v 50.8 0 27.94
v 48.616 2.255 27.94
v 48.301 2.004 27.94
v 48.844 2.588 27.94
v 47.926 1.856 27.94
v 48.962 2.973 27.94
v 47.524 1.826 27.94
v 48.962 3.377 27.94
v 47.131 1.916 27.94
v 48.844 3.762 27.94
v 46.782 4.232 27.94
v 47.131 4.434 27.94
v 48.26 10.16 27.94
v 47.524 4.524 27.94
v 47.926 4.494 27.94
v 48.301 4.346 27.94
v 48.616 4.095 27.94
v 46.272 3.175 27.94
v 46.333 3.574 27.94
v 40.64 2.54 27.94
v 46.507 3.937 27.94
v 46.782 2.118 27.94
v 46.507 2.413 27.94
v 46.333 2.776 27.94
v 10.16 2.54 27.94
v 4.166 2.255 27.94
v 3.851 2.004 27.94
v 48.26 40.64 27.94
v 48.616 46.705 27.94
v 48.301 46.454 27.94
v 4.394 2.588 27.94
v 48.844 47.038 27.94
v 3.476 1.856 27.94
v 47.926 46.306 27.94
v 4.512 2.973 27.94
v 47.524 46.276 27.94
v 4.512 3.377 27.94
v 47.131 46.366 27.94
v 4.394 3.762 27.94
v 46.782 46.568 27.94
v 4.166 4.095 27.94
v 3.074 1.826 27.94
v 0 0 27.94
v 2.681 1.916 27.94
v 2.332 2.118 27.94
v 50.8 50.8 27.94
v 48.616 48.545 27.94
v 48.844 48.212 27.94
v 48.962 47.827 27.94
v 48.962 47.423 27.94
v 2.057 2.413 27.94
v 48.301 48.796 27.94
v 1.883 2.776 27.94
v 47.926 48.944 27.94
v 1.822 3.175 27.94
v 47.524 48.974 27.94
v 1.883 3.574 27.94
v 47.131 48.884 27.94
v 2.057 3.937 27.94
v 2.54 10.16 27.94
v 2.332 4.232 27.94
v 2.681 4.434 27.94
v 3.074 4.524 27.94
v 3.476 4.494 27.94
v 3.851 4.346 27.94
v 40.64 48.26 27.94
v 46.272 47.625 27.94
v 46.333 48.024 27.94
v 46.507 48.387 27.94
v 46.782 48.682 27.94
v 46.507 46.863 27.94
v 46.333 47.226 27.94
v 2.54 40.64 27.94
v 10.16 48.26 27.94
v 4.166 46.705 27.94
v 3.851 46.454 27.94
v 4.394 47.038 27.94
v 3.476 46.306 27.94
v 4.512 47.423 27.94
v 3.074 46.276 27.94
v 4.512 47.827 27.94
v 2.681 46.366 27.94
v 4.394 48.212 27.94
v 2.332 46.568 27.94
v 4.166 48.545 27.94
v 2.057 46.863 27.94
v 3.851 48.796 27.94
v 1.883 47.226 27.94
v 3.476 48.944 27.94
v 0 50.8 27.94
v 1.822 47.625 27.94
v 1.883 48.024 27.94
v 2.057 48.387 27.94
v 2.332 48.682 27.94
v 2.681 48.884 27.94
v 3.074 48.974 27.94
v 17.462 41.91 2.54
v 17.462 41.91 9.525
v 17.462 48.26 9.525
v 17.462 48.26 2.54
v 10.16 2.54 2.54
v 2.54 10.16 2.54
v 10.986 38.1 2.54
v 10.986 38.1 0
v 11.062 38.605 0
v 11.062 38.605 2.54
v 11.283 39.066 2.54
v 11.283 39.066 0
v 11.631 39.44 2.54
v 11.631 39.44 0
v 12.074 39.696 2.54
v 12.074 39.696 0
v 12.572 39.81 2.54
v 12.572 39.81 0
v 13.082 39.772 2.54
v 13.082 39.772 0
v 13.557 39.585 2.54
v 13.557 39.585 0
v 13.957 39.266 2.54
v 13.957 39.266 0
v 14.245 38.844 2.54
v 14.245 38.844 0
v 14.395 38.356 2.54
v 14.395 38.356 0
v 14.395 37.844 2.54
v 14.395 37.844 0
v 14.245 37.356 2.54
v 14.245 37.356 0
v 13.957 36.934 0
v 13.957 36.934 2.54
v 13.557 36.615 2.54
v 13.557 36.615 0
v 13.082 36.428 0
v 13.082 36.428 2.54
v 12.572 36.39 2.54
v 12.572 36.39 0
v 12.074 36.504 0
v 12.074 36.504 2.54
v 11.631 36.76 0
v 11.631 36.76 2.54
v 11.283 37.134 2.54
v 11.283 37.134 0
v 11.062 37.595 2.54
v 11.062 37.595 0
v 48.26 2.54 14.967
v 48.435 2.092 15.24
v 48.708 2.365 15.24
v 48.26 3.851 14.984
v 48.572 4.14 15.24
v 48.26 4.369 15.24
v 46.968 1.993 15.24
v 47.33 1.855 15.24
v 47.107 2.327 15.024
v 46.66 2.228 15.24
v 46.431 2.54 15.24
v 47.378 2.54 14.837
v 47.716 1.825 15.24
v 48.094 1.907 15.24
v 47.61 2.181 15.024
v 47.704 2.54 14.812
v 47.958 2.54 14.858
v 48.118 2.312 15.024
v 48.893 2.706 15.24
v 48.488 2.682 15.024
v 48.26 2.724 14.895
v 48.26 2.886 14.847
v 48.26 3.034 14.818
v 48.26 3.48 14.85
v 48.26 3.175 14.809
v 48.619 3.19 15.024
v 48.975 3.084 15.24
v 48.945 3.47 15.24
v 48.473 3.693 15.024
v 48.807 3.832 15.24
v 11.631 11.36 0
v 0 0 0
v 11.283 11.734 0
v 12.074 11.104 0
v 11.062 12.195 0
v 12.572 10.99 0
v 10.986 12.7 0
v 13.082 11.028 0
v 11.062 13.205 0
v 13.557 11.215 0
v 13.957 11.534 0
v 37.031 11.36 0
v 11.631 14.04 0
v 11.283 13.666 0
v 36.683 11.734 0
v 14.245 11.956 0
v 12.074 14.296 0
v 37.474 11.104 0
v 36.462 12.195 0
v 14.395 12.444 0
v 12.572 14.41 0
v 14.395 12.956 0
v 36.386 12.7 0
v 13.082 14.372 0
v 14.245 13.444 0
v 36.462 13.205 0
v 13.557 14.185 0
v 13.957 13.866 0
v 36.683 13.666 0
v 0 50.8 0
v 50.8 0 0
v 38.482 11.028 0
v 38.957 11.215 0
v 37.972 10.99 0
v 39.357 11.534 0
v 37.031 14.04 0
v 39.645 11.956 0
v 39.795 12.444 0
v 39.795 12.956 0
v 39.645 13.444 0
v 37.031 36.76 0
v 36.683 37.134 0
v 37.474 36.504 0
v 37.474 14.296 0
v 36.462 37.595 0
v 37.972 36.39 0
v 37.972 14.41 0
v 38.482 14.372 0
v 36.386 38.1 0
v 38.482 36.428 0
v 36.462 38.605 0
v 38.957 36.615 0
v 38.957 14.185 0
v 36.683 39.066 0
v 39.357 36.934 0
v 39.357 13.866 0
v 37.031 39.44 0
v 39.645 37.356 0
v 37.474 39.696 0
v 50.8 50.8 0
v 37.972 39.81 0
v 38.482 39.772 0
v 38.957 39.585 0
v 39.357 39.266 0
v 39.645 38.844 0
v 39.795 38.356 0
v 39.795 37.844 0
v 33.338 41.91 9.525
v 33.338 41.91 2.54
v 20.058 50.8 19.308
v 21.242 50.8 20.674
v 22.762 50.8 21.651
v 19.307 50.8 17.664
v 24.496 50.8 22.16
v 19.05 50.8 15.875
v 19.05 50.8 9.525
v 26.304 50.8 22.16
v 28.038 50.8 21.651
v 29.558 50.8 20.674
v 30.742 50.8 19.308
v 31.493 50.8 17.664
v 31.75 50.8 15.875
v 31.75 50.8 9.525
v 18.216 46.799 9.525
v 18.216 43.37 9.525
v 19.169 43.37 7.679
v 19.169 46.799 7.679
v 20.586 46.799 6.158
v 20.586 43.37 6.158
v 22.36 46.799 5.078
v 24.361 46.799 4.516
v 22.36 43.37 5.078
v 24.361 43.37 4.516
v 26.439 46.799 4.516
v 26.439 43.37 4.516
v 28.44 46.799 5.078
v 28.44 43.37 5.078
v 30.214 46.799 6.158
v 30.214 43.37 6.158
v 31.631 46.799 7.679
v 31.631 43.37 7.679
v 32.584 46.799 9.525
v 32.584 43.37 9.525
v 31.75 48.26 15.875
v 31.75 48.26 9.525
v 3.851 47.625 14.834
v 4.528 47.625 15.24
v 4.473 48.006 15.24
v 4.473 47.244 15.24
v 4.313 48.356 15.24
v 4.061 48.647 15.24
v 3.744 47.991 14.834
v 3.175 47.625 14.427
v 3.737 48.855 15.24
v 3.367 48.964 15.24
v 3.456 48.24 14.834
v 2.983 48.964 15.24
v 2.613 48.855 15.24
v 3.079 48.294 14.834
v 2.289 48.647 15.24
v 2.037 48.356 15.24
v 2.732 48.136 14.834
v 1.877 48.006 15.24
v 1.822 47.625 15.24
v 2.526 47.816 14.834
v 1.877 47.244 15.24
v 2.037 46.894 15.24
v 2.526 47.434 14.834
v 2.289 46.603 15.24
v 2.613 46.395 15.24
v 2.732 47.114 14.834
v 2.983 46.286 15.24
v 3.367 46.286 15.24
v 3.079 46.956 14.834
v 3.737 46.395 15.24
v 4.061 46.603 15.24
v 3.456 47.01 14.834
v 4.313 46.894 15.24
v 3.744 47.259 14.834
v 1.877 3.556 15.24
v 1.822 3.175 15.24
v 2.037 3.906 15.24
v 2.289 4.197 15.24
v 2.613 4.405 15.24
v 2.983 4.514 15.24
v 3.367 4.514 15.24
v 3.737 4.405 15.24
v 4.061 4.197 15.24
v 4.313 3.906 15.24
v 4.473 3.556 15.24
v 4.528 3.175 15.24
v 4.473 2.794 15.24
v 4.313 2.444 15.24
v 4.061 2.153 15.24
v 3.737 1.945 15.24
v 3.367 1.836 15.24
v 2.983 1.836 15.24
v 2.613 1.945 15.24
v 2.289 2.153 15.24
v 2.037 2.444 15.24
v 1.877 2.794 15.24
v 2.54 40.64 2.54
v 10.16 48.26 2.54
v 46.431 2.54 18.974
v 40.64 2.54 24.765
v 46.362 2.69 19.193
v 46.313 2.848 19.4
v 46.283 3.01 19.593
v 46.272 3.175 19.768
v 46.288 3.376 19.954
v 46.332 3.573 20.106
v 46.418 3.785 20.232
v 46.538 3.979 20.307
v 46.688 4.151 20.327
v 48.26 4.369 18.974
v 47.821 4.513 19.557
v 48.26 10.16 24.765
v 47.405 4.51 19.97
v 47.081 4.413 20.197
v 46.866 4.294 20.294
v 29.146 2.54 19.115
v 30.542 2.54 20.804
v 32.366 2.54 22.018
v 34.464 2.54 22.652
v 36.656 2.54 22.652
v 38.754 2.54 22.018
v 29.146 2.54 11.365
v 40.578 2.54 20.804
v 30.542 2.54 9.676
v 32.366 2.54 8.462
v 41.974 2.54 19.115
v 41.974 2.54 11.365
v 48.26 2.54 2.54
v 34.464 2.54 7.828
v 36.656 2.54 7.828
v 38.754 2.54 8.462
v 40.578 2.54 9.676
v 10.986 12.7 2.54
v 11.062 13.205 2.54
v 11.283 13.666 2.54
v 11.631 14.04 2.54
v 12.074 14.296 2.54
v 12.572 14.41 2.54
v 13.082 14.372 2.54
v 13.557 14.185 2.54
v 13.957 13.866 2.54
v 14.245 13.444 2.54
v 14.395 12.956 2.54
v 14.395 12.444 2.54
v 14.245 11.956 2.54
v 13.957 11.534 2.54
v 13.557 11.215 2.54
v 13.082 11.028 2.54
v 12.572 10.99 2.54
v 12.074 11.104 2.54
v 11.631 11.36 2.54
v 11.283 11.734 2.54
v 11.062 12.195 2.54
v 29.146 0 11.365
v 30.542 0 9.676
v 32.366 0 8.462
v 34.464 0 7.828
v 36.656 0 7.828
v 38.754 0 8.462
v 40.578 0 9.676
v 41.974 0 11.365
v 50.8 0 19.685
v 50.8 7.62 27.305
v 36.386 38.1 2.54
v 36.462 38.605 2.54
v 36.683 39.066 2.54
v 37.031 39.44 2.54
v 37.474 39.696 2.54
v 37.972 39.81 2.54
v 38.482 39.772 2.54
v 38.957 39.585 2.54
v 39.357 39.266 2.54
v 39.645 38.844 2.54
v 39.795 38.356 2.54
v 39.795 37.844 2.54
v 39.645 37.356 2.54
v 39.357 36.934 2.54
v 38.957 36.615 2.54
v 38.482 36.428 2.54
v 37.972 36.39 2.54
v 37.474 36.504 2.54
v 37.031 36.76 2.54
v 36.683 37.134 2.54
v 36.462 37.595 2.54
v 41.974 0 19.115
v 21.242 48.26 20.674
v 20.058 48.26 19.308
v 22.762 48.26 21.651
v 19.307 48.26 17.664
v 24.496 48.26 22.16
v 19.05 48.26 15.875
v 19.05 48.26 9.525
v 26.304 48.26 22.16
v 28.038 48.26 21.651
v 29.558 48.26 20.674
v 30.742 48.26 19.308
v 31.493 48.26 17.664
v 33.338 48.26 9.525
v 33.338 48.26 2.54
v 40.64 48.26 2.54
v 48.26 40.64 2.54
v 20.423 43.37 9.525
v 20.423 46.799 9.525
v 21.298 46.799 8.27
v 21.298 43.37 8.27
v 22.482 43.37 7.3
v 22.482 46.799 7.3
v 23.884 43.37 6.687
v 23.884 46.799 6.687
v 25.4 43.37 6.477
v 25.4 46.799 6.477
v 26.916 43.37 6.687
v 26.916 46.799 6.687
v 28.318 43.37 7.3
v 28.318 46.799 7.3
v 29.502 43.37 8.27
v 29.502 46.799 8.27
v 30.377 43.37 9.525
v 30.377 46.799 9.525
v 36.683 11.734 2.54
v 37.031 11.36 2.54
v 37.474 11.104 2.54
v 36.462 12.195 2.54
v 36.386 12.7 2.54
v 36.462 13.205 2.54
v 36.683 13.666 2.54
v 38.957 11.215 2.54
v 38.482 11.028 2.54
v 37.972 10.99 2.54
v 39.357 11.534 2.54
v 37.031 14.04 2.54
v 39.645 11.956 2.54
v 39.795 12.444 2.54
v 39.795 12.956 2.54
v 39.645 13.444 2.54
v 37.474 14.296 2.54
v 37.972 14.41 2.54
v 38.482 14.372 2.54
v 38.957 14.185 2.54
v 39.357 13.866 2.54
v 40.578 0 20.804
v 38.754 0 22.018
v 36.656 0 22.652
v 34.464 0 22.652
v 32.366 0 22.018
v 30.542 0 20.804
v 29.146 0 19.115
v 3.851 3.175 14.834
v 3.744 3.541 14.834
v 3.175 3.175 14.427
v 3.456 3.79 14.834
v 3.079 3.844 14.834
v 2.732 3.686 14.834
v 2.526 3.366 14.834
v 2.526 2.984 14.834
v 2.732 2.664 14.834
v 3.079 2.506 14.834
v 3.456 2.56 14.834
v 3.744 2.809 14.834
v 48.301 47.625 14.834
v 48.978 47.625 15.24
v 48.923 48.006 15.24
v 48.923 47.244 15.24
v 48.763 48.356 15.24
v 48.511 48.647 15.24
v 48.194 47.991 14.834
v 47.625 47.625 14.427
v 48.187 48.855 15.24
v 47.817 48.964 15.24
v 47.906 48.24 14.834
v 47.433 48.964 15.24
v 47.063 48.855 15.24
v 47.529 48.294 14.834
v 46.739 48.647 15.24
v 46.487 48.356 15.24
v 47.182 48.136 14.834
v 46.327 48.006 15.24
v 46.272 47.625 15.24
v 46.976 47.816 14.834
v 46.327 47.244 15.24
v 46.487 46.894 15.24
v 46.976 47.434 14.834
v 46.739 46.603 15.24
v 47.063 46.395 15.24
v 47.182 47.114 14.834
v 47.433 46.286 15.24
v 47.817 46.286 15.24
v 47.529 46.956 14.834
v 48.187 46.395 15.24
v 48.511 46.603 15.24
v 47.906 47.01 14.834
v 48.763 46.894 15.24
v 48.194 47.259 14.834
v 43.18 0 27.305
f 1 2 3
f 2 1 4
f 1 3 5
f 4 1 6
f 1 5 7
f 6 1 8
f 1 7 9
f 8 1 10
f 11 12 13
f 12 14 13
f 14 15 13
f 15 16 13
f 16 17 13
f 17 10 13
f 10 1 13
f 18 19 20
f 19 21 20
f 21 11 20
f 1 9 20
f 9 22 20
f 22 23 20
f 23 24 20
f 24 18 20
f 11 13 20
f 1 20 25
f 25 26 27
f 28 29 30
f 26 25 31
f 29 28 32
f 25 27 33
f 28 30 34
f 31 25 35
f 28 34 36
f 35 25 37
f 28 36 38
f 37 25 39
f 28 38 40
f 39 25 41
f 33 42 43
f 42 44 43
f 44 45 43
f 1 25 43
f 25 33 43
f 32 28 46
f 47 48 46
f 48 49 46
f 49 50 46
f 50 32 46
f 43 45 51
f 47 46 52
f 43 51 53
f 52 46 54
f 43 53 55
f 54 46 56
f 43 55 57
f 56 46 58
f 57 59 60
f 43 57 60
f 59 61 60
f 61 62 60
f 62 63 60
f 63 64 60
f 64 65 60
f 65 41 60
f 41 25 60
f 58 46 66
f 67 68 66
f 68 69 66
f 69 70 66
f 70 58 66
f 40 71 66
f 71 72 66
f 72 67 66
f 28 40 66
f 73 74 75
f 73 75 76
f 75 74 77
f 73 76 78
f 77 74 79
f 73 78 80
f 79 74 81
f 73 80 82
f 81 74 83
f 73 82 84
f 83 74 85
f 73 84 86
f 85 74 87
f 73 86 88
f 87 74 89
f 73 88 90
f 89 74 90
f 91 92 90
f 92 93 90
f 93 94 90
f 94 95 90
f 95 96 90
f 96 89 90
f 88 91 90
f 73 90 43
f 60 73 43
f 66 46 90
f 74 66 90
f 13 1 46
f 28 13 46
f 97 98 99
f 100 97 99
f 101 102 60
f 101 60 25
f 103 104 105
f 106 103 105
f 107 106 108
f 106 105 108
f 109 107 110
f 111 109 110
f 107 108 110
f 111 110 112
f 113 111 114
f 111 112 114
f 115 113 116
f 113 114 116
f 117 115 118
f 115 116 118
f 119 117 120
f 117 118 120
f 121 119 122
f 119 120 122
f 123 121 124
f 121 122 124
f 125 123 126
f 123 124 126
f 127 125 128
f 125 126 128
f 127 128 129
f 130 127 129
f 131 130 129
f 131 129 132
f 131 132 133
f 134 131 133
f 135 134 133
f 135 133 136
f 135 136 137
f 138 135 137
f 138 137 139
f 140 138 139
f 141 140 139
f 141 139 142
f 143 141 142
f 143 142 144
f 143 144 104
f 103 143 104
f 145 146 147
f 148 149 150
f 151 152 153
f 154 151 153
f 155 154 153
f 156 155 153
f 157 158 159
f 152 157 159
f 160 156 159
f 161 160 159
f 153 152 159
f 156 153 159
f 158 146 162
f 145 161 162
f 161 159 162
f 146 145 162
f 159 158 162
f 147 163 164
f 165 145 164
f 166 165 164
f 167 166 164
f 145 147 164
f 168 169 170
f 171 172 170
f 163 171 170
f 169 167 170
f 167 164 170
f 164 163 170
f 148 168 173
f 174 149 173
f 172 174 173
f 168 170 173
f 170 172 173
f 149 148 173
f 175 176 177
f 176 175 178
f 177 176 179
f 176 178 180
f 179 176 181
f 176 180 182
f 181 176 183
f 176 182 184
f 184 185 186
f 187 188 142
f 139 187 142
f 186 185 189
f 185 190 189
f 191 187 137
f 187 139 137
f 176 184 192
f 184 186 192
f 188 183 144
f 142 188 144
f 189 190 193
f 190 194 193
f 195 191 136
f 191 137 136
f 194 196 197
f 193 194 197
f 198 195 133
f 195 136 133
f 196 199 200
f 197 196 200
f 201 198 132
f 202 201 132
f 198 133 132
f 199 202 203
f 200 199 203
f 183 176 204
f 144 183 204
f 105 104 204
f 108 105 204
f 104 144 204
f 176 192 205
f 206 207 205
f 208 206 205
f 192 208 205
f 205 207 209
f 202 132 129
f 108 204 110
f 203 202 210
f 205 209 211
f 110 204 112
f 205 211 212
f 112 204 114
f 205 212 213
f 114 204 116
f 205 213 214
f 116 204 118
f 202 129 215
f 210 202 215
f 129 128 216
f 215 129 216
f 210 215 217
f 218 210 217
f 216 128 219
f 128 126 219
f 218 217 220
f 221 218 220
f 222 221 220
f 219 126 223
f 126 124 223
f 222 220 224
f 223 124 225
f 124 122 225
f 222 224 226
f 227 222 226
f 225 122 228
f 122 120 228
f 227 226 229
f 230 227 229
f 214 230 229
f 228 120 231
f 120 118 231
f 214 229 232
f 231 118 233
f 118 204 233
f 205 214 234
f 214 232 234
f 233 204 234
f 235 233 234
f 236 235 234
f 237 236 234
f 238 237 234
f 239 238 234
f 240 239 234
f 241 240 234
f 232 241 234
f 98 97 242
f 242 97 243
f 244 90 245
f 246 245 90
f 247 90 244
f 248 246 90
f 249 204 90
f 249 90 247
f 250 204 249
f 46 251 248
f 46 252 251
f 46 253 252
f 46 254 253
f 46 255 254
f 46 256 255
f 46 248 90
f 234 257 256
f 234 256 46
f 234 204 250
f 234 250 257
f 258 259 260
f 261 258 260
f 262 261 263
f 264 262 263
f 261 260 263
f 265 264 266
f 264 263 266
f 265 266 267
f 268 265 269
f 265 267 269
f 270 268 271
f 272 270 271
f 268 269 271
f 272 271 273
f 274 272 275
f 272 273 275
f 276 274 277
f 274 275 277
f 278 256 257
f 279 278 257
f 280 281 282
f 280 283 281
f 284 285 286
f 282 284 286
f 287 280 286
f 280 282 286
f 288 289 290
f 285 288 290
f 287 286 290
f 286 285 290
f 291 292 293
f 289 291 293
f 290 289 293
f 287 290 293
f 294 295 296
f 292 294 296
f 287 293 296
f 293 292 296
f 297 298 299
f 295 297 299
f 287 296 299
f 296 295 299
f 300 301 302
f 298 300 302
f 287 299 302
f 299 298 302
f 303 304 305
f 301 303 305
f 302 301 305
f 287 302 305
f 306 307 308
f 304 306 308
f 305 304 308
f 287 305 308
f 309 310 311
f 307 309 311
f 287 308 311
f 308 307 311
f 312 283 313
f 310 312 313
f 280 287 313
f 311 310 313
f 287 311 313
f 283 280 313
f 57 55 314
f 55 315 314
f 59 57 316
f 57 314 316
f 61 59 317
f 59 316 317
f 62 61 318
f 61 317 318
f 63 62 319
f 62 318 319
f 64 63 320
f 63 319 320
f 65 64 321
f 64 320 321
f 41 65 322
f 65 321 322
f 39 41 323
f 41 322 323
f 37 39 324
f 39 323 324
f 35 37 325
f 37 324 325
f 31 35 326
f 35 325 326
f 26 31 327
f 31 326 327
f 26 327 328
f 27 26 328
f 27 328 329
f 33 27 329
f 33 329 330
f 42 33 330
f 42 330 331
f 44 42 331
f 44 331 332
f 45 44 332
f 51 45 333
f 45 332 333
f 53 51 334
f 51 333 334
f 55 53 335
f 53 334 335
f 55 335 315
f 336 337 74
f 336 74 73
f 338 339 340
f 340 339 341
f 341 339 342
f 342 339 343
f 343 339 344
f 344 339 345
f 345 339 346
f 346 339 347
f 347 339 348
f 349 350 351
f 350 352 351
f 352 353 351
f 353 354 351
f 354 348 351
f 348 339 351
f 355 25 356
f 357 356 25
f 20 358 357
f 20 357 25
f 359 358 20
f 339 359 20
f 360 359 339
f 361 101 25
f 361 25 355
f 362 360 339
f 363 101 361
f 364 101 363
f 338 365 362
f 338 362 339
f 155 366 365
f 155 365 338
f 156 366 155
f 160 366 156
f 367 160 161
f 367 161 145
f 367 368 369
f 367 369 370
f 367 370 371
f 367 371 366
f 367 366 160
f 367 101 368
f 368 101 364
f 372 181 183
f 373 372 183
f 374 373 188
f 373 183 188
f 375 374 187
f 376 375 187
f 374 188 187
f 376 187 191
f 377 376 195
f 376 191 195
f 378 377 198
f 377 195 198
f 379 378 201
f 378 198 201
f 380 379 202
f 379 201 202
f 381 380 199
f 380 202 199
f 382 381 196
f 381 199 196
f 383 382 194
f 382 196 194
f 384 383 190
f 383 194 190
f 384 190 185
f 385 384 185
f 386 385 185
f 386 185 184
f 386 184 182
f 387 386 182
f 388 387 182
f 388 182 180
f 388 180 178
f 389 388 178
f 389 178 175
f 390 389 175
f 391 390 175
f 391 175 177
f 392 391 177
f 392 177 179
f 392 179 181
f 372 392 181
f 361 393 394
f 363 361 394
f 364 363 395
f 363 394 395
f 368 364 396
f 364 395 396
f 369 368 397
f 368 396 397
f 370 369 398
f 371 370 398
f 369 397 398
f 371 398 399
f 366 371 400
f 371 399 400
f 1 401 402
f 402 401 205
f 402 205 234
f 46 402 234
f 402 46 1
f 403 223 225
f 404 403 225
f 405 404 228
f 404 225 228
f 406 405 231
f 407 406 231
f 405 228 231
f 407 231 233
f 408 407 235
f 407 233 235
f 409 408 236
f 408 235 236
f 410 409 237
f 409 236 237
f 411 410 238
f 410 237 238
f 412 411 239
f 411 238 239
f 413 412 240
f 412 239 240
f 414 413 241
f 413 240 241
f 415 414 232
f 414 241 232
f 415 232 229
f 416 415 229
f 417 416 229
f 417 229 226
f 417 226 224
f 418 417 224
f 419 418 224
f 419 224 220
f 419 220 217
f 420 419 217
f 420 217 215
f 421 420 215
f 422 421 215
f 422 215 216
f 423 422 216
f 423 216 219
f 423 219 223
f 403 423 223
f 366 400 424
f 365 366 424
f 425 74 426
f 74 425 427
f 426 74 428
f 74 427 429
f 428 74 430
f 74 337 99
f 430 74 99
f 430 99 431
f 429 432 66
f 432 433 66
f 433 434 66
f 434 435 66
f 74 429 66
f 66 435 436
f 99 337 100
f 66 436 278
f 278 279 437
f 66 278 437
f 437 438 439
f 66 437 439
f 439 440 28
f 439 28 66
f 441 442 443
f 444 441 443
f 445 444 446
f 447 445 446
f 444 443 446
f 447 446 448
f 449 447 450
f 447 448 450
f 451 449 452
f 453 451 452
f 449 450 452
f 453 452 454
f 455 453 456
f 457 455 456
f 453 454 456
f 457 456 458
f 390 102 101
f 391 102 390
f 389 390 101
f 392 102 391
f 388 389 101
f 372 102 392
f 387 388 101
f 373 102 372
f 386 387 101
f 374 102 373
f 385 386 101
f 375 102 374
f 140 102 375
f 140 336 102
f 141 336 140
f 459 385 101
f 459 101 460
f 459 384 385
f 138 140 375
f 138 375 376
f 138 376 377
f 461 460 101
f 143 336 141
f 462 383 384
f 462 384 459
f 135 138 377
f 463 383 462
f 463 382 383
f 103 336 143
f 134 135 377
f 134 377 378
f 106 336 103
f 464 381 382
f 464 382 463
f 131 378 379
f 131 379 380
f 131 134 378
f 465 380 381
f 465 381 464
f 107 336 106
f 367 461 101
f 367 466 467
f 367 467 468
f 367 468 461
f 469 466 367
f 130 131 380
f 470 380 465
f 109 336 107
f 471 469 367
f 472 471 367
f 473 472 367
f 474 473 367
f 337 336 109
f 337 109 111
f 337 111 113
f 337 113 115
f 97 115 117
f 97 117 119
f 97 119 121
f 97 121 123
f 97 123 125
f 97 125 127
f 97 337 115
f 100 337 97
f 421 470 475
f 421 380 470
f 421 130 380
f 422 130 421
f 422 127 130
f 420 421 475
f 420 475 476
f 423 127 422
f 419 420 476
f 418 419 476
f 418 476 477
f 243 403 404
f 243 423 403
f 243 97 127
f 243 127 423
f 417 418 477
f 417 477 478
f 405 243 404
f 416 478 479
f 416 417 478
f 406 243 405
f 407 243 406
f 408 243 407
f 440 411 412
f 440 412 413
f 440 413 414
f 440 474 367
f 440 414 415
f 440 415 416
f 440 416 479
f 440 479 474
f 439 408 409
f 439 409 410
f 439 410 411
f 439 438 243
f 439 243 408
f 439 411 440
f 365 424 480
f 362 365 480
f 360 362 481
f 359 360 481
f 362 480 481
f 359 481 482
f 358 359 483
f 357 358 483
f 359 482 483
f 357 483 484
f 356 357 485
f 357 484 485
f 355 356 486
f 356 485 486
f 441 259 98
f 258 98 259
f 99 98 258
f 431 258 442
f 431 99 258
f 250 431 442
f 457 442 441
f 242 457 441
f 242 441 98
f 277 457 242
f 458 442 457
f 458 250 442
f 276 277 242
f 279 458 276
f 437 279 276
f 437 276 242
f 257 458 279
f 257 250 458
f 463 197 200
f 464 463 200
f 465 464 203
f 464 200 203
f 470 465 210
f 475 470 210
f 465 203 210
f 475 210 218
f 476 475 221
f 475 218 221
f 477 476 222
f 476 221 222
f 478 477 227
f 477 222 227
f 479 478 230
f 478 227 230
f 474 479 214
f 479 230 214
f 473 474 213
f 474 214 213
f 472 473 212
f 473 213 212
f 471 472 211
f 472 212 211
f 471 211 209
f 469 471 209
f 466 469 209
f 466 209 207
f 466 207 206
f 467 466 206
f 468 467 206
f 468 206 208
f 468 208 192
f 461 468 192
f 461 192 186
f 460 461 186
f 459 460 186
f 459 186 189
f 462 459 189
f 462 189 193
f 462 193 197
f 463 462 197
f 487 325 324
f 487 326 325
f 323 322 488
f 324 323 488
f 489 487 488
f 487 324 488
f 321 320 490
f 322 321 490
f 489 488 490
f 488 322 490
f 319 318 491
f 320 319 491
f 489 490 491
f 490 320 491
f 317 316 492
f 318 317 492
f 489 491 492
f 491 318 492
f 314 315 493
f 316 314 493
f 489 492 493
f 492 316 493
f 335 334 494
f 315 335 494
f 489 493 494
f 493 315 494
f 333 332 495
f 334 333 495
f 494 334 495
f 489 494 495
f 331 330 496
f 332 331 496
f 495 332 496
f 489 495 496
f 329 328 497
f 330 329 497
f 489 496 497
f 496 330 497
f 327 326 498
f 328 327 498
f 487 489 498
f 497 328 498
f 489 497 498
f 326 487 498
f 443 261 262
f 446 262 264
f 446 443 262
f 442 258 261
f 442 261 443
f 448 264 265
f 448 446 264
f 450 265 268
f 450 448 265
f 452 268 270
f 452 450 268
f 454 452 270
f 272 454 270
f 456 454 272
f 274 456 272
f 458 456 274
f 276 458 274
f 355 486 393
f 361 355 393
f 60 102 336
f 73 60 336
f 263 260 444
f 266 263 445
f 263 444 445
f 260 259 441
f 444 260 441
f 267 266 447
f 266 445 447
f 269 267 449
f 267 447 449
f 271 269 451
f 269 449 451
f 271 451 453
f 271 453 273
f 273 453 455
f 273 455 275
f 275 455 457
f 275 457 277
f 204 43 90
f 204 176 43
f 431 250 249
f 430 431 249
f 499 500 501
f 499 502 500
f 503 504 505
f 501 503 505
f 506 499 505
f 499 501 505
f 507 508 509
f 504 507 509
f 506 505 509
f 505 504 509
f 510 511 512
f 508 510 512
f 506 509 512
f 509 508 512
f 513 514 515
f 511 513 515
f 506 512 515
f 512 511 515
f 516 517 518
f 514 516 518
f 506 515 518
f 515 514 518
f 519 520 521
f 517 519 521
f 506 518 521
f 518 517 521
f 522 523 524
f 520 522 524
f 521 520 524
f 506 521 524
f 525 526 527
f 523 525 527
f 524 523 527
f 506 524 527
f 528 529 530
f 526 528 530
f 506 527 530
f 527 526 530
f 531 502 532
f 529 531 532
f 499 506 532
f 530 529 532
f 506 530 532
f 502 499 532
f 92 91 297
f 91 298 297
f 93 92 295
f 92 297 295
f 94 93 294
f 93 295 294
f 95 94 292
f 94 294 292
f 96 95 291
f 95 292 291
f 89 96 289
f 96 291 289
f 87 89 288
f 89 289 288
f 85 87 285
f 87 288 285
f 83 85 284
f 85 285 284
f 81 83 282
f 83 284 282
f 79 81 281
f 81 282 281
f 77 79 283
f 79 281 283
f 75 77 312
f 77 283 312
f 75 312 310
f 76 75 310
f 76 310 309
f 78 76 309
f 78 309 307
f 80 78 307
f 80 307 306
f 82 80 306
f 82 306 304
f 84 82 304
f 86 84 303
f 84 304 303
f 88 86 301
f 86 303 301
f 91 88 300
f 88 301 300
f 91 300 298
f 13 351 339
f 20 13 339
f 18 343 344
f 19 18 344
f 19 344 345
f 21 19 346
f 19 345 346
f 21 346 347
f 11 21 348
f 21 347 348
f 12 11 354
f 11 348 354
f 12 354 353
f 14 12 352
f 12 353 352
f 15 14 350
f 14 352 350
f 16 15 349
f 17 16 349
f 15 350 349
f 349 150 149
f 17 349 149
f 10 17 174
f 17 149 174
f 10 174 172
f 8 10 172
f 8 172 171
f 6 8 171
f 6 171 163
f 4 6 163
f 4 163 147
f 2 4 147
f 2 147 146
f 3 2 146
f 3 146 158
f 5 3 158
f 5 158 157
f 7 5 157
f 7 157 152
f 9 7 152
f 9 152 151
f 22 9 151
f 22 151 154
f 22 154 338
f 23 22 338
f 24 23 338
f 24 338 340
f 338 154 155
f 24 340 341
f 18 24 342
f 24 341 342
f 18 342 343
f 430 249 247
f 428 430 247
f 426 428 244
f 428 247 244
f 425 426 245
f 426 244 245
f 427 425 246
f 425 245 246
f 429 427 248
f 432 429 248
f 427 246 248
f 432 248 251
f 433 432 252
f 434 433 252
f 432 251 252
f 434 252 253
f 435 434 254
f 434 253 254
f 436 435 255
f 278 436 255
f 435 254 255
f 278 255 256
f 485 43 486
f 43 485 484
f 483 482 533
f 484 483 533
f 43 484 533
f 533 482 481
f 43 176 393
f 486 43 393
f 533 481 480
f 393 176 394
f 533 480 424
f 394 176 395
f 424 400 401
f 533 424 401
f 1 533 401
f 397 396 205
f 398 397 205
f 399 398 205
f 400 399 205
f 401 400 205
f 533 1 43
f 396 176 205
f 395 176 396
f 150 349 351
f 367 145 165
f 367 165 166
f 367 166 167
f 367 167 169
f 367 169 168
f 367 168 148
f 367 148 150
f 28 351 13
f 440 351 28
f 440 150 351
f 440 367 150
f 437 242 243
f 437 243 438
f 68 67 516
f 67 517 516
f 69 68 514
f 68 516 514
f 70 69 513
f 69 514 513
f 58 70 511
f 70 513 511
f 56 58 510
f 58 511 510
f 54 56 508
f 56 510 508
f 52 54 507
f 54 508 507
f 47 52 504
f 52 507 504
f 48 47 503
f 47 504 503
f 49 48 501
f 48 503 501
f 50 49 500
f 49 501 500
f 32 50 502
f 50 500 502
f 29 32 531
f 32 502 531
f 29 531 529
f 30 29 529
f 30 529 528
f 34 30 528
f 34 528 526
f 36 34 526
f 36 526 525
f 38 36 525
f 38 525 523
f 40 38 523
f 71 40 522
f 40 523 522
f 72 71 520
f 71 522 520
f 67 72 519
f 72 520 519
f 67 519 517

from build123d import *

# Parameters (mm, degrees)
SKETCH1_W                 = 50.8
SKETCH1_H                 = 50.8
BOSS_EXTRUDE1_DEPTH       = 2.54
SKETCH2_W                 = 50.8
SKETCH2_H                 = 50.8
SKETCH2_W_2               = 45.72
SKETCH2_H_2               = 45.72
BOSS_EXTRUDE2_DEPTH       = 25.4
CUT_EXTRUDE1_REACH        = 79.084
CUT_EXTRUDE3_REACH        = 79.084
BOSS_EXTRUDE3_DEPTH       = 25.4
CUT_EXTRUDE4_START        = -2.54
SKETCH8_W                 = 22.225
SKETCH8_H                 = 7.62
CUT_EXTRUDE4_DEPTH        = 12.7
LOFT1_START               = 36.295124673
LOFT1_DEPTH               = 4.399409051
F_6_32_TAPPED_HOLE1_D     = 2.7051
F_6_32_TAPPED_HOLE1_DEPTH = 12.7
F_6_32_TAPPED_HOLE1_TIP   = 0.81269403
F_6_CLEARANCE_HOLE1_D     = 3.429
SKETCH15_W                = 15.875
SKETCH15_H                = 6.35
BOSS_EXTRUDE5_DEPTH       = 6.985
CUT_EXTRUDE5_START        = -3.175
SKETCH16_R                = 7.62
SKETCH16_R_2              = 5.588
CUT_EXTRUDE5_DEPTH        = 1.7145


with BuildPart() as part:
    # Sketch1 → Boss-Extrude1 (new body)
    with BuildSketch(Plane.XY):
        with Locations((25.4, 25.4)):
            Rectangle(SKETCH1_W, SKETCH1_H)
    extrude(amount=BOSS_EXTRUDE1_DEPTH)

    # Sketch2 → Boss-Extrude2 (add)
    with BuildSketch(Plane.XY.offset(2.54)):
        with Locations((25.4, 25.4)):
            Rectangle(SKETCH2_W, SKETCH2_H)
        with Locations((25.4, 25.4)):
            Rectangle(SKETCH2_W_2, SKETCH2_H_2, mode=Mode.SUBTRACT)
    extrude(amount=BOSS_EXTRUDE2_DEPTH)

    # Sketch3 → Cut-Extrude1 (cut, up to next)
    with BuildSketch(Plane.XZ, mode=Mode.PRIVATE) as cut_extrude1_sk1:
        with BuildLine():
            Line((29.1465, 19.114540844), (29.1465, 11.365459156))
            ThreePointArc((29.1465, 11.365459156), (35.56, 7.747), (41.9735, 11.365459156))
            Line((41.9735, 11.365459156), (41.9735, 19.114540844))
            ThreePointArc((41.9735, 19.114540844), (35.56, 22.733), (29.1465, 19.114540844))
        make_face()
    cut_extrude1_tool1 = extrude(cut_extrude1_sk1.sketch, amount=-CUT_EXTRUDE1_REACH, mode=Mode.PRIVATE) & part.part
    add(cut_extrude1_tool1.solids().sort_by_distance((35.56, 0, 15.24))[0], mode=Mode.SUBTRACT)

    # Sketch4 → Cut-Extrude3 (cut, up to next)
    with BuildSketch(Plane(origin=(0, 50.8, 0), x_dir=(1, 0, 0), z_dir=(0, 1, 0)), mode=Mode.PRIVATE) as cut_extrude3_sk1:
        with BuildLine():
            Line((31.75, -15.875), (31.75, -9.525))
            Line((31.75, -9.525), (19.05, -9.525))
            Line((19.05, -9.525), (19.05, -15.875))
            ThreePointArc((19.05, -15.875), (25.4, -22.225), (31.75, -15.875))
        make_face()
    cut_extrude3_tool1 = extrude(cut_extrude3_sk1.sketch, amount=-CUT_EXTRUDE3_REACH, mode=Mode.PRIVATE) & part.part
    add(cut_extrude3_tool1.solids().sort_by_distance((25.4, 50.8, 15.282228))[0], mode=Mode.SUBTRACT)

    # Sketch6 → Boss-Extrude3 (add)
    with BuildSketch(Plane.XY.offset(2.54)):
        Polygon((2.54, 48.26), (10.16, 48.26), (2.54, 40.64), align=None)
        Polygon((48.26, 48.26), (48.26, 40.64), (40.64, 48.26), align=None)
        Polygon((48.26, 2.54), (48.26, 10.16), (40.64, 2.54), align=None)
        Polygon((2.54, 2.54), (2.54, 10.16), (10.16, 2.54), align=None)
    extrude(amount=BOSS_EXTRUDE3_DEPTH)

    # Sketch8 → Cut-Extrude4 (cut)
    with BuildSketch(Plane(origin=(50.8, 0, 0), x_dir=(0, 0, -1), z_dir=(1, 0, 0)).offset(CUT_EXTRUDE4_START)):
        with Locations((-13.6525, 6.35)):
            Rectangle(SKETCH8_W, SKETCH8_H)
    extrude(amount=-CUT_EXTRUDE4_DEPTH, mode=Mode.SUBTRACT)

    # Loft1: read off the stored shape, not the designer's step
    # Loft1 outline → Loft1 (add)
    with BuildSketch(Plane(origin=(0, 0, 0), x_dir=(0.8164965809277258, 0.40824829046386313, -0.40824829046386313), z_dir=(0.5773502691896258, -0.5773502691896258, 0.5773502691896258)).offset(LOFT1_START)):
        Polygon((33.441658713, 24.695704333), (24.109102793, 19.30755066), (33.441658713, 13.919396988), align=None)
    extrude(amount=LOFT1_DEPTH)

    # #6-32 Tapped Hole1
    with Locations(Plane.XY.offset(27.94)):
        with Locations((47.625, 3.175), (47.625, 47.625), (3.175, 47.625), (3.175, 3.175)):
            Hole(F_6_32_TAPPED_HOLE1_D / 2, depth=F_6_32_TAPPED_HOLE1_DEPTH)
            with Locations((0, 0, -(F_6_32_TAPPED_HOLE1_DEPTH + F_6_32_TAPPED_HOLE1_TIP / 2))):  # 118° drill point
                Cone(0, F_6_32_TAPPED_HOLE1_D / 2, F_6_32_TAPPED_HOLE1_TIP, mode=Mode.SUBTRACT)

    # #6 Clearance Hole1 (through all)
    with Locations(Plane.XY.offset(2.54)):
        with Locations((12.7, 38.1), (38.1, 38.1), (38.1, 12.7), (12.7, 12.7)):
            Hole(F_6_CLEARANCE_HOLE1_D / 2)

    # Sketch15 → Boss-Extrude5 (add)
    with BuildSketch(Plane.XY.offset(2.54)):
        with Locations((25.4, 45.085)):
            Rectangle(SKETCH15_W, SKETCH15_H)
    extrude(amount=BOSS_EXTRUDE5_DEPTH)

    # Sketch16 → Cut-Extrude5 (cut, symmetric)
    with BuildSketch(Plane.XZ.offset(-41.91).offset(CUT_EXTRUDE5_START)):
        with Locations((25.4, 12.065)):
            Circle(SKETCH16_R)
        with Locations((25.4, 12.065)):
            Circle(SKETCH16_R_2, mode=Mode.SUBTRACT)
    extrude(amount=CUT_EXTRUDE5_DEPTH, both=True, mode=Mode.SUBTRACT)


solid = part.part
